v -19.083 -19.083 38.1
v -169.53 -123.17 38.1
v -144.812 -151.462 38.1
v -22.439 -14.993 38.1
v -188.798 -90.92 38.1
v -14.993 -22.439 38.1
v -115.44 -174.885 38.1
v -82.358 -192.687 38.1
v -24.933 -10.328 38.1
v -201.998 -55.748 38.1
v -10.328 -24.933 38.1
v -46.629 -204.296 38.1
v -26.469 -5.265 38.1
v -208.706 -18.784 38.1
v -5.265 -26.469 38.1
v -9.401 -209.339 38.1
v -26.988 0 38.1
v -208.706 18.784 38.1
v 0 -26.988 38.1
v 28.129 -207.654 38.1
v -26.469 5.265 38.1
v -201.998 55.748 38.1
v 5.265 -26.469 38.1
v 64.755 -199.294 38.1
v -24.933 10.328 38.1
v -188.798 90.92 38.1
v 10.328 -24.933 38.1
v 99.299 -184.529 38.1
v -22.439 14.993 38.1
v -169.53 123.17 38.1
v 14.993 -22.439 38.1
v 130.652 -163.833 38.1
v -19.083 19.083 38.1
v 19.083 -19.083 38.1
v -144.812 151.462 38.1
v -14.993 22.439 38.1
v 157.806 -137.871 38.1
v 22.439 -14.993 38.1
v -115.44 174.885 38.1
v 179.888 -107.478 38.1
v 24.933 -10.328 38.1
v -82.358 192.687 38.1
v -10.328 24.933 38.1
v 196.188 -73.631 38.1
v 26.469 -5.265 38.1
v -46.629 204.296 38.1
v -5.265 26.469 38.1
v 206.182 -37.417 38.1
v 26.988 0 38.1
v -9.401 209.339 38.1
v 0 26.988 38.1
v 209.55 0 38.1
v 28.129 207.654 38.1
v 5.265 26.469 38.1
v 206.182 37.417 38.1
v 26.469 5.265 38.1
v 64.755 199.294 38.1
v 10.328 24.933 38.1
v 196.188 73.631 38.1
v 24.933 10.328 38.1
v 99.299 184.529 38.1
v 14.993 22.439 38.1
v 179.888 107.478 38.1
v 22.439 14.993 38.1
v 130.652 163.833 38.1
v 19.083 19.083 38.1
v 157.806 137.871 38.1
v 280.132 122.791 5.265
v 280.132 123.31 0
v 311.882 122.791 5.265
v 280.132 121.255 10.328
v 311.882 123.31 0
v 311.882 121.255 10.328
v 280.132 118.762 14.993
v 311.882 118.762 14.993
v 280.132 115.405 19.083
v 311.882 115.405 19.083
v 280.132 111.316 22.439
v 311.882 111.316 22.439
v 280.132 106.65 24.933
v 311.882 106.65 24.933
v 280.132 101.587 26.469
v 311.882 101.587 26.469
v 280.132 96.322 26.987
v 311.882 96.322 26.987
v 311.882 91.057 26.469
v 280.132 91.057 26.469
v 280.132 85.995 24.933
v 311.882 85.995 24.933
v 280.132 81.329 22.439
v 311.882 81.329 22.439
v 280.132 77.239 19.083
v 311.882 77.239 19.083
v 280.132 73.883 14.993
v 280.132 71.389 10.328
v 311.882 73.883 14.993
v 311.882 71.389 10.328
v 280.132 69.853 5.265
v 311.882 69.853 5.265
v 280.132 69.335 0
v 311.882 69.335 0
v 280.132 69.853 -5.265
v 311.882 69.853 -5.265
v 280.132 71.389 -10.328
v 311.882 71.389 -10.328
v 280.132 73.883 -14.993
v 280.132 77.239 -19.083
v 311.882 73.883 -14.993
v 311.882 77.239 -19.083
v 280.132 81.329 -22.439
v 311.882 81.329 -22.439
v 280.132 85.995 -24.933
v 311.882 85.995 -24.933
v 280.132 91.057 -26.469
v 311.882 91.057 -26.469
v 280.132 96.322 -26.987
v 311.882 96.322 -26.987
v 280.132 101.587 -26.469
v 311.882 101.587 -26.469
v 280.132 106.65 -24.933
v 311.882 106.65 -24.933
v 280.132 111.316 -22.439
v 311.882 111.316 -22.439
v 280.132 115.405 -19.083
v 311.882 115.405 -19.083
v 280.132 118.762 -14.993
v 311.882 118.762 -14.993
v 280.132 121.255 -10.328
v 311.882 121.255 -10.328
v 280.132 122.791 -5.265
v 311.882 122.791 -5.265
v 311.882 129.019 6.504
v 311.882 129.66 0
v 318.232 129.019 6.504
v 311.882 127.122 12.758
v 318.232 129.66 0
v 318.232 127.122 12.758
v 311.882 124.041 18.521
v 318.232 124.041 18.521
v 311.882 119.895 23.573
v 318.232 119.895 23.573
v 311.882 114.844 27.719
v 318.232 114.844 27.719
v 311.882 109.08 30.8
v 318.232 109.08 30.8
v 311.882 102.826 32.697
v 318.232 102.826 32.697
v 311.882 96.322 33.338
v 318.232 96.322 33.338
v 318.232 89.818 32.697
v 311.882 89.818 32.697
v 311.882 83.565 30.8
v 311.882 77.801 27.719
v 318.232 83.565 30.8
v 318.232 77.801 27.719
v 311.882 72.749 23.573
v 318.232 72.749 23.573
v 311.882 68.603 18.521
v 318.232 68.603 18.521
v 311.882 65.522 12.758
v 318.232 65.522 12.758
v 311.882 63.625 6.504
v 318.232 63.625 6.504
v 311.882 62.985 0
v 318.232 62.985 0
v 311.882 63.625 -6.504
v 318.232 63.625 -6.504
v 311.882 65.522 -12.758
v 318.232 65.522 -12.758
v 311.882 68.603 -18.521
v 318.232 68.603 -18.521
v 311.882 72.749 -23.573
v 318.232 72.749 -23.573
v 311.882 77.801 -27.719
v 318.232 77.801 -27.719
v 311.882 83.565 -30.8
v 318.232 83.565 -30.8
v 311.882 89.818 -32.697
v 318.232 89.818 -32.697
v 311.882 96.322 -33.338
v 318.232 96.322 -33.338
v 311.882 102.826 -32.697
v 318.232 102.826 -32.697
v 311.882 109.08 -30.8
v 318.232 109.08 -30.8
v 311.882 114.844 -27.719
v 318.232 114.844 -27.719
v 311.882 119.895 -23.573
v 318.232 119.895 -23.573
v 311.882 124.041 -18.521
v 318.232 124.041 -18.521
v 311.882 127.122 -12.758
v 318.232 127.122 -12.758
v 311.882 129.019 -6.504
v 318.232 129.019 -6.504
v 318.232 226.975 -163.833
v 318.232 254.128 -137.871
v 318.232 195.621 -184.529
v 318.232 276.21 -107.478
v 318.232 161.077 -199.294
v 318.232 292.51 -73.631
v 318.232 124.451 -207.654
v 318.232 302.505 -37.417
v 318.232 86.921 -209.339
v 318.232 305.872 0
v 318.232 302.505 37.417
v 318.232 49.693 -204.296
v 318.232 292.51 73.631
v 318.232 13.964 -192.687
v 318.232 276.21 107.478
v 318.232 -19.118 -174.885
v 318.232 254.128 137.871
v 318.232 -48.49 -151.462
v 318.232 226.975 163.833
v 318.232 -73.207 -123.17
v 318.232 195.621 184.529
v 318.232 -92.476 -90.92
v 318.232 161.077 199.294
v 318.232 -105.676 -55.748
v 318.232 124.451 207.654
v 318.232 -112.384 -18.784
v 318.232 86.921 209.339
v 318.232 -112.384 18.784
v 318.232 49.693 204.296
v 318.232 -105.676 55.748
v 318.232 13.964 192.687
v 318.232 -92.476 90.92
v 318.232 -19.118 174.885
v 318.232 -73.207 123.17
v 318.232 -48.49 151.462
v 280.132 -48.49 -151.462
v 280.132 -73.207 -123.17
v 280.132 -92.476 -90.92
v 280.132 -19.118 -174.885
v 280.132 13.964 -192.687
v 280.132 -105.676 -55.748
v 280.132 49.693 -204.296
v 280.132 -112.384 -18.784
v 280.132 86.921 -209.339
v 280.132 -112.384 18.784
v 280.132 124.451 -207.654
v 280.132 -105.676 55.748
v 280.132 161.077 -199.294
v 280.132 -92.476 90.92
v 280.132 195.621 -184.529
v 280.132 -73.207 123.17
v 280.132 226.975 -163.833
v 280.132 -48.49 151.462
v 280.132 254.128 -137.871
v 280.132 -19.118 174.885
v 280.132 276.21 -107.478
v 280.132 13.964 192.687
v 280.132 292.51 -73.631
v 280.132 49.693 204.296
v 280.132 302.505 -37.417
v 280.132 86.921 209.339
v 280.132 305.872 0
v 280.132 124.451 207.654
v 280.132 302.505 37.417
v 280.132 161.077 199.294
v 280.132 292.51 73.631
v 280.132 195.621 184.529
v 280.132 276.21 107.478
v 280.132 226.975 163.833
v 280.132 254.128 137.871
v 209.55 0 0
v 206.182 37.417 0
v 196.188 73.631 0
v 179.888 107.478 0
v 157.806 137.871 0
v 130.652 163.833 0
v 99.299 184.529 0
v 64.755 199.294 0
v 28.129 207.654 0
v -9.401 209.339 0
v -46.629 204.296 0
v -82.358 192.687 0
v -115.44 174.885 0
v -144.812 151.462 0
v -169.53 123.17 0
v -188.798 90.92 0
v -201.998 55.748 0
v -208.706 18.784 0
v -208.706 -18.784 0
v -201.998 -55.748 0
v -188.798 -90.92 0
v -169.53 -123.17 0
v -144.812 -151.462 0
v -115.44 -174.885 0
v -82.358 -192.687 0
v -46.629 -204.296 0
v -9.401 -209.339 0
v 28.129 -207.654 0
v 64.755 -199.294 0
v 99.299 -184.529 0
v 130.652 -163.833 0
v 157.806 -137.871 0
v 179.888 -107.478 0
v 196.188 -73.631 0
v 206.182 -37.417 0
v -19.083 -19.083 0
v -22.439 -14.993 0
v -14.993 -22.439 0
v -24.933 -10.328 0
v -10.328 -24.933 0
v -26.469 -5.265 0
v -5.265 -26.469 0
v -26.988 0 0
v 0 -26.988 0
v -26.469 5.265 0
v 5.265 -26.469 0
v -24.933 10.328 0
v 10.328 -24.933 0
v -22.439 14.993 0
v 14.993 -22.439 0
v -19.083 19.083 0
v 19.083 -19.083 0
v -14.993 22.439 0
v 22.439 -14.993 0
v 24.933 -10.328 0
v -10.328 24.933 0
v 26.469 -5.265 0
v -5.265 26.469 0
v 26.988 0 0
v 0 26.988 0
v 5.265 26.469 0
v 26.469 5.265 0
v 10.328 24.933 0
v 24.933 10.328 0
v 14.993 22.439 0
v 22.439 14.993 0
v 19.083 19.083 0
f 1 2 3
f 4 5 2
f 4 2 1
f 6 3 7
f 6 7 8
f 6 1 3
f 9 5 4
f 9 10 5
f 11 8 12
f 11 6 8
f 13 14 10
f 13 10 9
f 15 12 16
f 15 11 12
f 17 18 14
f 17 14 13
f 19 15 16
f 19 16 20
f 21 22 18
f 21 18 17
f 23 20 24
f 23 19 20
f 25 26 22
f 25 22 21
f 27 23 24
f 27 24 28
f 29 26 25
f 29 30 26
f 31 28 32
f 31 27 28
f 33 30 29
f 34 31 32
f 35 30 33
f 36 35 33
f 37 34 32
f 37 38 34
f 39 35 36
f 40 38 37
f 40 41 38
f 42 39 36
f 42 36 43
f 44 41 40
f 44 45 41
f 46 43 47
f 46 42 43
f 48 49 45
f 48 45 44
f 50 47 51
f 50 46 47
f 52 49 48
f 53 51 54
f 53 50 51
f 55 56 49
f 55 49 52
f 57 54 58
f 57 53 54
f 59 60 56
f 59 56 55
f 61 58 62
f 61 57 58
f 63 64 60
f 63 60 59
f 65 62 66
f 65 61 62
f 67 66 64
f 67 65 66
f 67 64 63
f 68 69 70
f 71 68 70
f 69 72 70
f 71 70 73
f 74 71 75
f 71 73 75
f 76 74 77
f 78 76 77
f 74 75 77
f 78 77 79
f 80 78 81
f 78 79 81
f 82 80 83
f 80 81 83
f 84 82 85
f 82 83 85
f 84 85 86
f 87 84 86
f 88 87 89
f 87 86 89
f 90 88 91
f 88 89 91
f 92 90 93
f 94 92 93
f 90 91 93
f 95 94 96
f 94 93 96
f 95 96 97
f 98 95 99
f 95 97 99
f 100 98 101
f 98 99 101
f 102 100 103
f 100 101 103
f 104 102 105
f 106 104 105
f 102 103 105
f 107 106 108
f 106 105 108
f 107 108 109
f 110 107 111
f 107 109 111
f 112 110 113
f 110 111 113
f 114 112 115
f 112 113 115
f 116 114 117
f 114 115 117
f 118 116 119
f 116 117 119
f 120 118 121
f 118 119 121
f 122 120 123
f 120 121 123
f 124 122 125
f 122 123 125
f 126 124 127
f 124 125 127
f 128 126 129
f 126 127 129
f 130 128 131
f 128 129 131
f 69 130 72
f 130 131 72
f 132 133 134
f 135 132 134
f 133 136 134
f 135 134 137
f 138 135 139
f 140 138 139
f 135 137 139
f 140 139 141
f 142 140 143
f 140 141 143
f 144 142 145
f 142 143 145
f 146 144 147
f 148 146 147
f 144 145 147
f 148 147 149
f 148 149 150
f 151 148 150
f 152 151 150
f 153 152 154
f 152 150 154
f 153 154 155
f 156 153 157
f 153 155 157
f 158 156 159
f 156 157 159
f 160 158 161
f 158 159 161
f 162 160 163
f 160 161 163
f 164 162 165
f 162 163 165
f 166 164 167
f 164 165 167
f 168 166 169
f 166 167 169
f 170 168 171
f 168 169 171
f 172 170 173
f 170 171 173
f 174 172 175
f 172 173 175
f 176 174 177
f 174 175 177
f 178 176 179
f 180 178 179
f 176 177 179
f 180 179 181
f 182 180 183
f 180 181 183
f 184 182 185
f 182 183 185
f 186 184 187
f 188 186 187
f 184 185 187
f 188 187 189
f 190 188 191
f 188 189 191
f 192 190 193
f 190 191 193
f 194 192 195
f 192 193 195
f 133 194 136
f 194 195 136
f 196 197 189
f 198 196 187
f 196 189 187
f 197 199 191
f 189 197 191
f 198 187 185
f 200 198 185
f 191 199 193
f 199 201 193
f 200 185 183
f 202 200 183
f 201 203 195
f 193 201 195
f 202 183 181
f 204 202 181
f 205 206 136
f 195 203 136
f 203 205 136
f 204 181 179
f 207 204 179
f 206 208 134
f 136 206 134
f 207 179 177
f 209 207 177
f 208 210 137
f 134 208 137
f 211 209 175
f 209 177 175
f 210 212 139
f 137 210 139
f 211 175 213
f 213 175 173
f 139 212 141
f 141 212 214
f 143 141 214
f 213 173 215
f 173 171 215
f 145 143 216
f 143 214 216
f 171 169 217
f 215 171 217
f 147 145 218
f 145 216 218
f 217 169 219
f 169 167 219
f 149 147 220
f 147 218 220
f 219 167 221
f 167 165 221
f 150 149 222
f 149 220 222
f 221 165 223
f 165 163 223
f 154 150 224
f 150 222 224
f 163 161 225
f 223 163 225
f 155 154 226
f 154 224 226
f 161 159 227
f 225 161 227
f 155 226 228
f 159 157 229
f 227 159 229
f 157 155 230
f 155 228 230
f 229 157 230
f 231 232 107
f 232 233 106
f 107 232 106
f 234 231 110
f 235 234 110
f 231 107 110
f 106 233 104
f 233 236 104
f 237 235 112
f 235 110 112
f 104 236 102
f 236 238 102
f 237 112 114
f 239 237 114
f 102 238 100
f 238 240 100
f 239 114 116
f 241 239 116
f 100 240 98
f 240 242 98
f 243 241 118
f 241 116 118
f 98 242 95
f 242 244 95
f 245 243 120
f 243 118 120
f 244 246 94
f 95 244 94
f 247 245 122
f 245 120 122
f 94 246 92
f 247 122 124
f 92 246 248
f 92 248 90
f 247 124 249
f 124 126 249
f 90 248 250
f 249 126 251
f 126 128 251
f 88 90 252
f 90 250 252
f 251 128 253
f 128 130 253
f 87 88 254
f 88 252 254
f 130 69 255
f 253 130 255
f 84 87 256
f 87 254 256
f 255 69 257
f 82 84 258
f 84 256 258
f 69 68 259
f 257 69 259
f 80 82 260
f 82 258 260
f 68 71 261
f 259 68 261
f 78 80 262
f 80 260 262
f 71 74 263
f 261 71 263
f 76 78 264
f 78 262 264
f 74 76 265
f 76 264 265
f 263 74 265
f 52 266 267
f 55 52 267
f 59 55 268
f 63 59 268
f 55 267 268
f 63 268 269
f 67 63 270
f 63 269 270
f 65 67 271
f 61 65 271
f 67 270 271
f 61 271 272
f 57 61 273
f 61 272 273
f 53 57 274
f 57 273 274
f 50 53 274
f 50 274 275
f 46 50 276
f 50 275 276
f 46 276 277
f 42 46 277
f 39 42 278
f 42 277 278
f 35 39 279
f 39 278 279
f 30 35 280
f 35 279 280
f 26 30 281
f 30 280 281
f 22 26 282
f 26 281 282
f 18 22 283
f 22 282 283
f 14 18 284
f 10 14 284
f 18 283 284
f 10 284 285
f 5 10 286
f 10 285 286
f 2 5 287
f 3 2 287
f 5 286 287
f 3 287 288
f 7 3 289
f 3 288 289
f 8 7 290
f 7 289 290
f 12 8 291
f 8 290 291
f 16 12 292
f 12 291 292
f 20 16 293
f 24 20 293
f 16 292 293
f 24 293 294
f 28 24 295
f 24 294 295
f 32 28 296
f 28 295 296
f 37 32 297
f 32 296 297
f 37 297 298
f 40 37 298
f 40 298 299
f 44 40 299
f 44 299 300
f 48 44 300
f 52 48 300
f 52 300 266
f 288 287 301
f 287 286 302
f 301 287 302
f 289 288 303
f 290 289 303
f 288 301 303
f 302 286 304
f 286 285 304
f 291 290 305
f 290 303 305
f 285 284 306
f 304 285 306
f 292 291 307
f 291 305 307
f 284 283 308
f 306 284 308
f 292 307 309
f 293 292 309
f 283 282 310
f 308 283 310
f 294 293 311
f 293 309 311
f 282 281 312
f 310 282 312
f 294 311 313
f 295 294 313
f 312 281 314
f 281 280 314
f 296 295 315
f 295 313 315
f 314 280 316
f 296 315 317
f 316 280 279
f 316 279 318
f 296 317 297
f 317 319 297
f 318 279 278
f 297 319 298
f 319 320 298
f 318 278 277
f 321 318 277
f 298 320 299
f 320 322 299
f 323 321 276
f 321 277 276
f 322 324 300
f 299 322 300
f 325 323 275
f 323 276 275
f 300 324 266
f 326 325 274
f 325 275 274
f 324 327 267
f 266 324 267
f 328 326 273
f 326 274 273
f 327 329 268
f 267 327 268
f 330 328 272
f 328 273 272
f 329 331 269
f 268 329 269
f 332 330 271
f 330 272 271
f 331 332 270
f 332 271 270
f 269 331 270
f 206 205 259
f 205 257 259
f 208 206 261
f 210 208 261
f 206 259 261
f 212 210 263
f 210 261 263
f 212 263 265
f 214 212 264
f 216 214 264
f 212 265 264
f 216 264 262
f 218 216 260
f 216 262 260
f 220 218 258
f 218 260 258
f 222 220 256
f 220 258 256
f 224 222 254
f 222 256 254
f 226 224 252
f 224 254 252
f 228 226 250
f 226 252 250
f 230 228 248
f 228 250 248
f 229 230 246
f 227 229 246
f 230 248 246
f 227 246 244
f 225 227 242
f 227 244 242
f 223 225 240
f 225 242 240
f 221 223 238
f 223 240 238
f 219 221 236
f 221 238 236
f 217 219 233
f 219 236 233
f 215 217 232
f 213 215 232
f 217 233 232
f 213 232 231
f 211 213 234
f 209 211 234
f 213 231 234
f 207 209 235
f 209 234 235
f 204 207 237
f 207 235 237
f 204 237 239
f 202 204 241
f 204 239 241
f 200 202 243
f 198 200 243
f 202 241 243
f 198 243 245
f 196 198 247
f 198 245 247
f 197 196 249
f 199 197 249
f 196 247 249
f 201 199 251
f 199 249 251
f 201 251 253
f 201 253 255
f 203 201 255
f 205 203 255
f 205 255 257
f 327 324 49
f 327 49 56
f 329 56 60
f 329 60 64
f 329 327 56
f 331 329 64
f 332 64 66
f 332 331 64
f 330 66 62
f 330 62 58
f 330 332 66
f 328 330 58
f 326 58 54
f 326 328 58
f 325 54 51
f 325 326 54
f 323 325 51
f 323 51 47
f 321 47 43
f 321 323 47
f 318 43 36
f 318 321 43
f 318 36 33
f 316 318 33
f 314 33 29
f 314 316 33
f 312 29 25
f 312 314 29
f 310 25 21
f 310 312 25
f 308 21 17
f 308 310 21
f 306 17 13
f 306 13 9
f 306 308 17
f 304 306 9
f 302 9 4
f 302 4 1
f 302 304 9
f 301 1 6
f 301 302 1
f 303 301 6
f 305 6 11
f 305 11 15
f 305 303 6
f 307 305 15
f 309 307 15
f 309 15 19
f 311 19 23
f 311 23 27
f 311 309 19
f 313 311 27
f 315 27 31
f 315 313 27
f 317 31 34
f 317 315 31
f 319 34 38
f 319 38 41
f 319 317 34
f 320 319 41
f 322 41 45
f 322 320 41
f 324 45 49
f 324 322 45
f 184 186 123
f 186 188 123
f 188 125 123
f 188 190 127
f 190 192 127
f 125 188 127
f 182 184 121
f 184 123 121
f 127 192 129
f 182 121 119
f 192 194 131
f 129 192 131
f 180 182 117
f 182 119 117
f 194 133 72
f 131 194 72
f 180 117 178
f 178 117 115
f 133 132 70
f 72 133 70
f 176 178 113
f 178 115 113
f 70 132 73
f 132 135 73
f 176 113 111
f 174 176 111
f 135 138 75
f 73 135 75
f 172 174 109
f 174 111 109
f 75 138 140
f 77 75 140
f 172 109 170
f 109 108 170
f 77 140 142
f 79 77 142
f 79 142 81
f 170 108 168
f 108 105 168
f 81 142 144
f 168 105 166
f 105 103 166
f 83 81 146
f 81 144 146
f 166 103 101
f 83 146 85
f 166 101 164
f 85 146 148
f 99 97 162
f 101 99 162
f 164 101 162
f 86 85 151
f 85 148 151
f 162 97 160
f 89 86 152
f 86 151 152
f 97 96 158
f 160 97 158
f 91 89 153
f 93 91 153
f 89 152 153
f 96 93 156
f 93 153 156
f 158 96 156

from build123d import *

# Parameters (mm, degrees)
F0_R     = 209.55
F0_R_2   = 26.9875
F1_DEPTH = 38.1


with BuildPart() as f1:
    # F0 (on Top) → F1 (new body)
    with BuildSketch(Plane.XY):
        Circle(F0_R)
        Circle(F0_R_2, mode=Mode.SUBTRACT)
    extrude(amount=F1_DEPTH)


with BuildPart() as f3:
    # F2 (on Top) → F3 (revolve)
    with BuildSketch(Plane.XY):
        Polygon((280.131588, 276.402519), (280.131588, 123.309736), (311.881588, 123.309736), (311.881588, 129.659736), (318.231588, 129.659736), (318.231588, 276.402519), (318.231588, 305.872236), (280.131588, 305.872236), align=None)
    revolve(axis=Axis((309.918866, 96.322236, 0), (1, 0, 0)))


solid = Compound([f1.part, f3.part])
